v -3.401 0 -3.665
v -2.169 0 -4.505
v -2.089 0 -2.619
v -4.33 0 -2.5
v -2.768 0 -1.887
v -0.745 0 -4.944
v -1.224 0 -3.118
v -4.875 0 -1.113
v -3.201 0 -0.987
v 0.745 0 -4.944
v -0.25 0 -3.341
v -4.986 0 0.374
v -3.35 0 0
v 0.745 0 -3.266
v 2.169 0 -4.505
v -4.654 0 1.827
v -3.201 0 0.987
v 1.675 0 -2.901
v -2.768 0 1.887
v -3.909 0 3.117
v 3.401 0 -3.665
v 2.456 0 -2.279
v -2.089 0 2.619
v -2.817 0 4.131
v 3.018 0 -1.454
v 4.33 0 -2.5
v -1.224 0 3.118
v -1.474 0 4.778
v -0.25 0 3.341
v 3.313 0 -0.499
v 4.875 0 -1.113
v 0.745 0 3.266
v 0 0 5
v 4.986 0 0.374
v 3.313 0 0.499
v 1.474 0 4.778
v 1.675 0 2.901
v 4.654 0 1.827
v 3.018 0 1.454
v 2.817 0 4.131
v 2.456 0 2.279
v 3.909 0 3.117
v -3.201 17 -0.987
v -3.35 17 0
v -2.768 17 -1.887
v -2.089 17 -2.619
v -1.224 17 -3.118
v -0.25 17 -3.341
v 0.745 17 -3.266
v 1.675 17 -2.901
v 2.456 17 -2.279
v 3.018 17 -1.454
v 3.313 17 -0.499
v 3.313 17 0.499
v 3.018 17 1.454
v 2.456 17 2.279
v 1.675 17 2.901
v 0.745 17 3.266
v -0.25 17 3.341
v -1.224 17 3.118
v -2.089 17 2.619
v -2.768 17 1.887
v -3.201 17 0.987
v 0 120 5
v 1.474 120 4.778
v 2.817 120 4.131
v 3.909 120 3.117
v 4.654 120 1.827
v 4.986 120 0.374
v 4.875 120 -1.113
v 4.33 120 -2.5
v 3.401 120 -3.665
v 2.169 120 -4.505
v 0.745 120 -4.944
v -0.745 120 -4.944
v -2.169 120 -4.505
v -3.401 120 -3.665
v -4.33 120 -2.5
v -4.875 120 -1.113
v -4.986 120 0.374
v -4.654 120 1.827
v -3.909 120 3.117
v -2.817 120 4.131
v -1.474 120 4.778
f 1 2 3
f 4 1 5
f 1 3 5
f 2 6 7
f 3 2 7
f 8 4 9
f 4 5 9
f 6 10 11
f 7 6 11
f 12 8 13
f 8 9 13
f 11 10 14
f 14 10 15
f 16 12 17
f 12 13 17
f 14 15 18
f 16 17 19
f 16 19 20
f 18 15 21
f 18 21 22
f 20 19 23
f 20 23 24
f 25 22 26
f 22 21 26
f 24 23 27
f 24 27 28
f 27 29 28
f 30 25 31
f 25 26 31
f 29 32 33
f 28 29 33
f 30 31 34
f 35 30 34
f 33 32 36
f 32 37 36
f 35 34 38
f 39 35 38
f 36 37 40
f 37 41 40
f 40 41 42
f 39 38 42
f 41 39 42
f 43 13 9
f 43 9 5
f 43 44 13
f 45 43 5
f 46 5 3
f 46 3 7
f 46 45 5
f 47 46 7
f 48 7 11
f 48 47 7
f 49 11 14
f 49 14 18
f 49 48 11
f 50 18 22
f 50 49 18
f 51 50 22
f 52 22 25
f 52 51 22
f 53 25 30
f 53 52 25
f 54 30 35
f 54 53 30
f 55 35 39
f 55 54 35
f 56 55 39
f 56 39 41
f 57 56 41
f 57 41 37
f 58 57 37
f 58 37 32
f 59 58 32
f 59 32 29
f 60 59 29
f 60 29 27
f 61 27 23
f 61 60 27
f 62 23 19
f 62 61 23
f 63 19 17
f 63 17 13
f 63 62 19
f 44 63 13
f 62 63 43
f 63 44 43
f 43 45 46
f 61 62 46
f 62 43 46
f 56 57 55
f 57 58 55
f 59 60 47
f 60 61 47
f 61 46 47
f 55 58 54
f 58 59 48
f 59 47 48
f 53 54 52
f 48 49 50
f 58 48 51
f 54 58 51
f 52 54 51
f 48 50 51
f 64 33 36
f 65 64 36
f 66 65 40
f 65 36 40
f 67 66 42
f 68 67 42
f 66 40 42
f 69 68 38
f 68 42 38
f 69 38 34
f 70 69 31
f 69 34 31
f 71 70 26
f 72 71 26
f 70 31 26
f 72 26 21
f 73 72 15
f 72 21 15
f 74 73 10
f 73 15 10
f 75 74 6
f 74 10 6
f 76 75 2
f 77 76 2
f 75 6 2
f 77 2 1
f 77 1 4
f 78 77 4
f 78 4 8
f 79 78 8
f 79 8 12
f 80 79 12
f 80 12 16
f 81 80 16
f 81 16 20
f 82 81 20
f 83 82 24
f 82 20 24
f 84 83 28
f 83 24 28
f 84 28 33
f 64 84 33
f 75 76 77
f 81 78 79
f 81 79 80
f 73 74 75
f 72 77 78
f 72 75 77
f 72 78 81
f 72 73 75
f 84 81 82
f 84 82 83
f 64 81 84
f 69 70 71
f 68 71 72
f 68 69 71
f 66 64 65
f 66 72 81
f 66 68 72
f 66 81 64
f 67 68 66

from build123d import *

# Parameters (mm, degrees)
SKETCH4_R           = 5
BOSS_EXTRUDE1_DEPTH = 120
SKETCH5_W           = 3.35
SKETCH5_H           = 17


with BuildPart() as part:
    # Sketch3 → Revolve1 (revolve)
    with BuildSketch(Plane.XY, mode=Mode.PRIVATE) as revolve1_sk:
        Polygon((0, 0), (2.7, 0), (3.35, 17), (0, 17), align=None)
    revolve(revolve1_sk.sketch.rotate(Axis((0, 17, 0), (0, -1, 0)), 180), axis=Axis((0, 17, 0), (0, -1, 0)))

    # Sketch4 → Boss-Extrude1 (add)
    with BuildSketch(Plane(origin=(0, 0, 0), x_dir=(1, 0, 0), z_dir=(0, 1, 0))):
        with Locations(Location((0, 0, 0), (0, 0, 270))):
            Circle(SKETCH4_R)
    extrude(amount=BOSS_EXTRUDE1_DEPTH)

    # Sketch5 → Cut-Revolve1 (revolve, cut)
    with BuildSketch(Plane.XY, mode=Mode.PRIVATE) as cut_revolve1_sk:
        with Locations((1.675, 8.5)):
            Rectangle(SKETCH5_W, SKETCH5_H)
    revolve(cut_revolve1_sk.sketch.rotate(Axis((0, 17, 0), (0, -1, 0)), 180), axis=Axis((0, 17, 0), (0, -1, 0)), mode=Mode.SUBTRACT)


solid = part.part
